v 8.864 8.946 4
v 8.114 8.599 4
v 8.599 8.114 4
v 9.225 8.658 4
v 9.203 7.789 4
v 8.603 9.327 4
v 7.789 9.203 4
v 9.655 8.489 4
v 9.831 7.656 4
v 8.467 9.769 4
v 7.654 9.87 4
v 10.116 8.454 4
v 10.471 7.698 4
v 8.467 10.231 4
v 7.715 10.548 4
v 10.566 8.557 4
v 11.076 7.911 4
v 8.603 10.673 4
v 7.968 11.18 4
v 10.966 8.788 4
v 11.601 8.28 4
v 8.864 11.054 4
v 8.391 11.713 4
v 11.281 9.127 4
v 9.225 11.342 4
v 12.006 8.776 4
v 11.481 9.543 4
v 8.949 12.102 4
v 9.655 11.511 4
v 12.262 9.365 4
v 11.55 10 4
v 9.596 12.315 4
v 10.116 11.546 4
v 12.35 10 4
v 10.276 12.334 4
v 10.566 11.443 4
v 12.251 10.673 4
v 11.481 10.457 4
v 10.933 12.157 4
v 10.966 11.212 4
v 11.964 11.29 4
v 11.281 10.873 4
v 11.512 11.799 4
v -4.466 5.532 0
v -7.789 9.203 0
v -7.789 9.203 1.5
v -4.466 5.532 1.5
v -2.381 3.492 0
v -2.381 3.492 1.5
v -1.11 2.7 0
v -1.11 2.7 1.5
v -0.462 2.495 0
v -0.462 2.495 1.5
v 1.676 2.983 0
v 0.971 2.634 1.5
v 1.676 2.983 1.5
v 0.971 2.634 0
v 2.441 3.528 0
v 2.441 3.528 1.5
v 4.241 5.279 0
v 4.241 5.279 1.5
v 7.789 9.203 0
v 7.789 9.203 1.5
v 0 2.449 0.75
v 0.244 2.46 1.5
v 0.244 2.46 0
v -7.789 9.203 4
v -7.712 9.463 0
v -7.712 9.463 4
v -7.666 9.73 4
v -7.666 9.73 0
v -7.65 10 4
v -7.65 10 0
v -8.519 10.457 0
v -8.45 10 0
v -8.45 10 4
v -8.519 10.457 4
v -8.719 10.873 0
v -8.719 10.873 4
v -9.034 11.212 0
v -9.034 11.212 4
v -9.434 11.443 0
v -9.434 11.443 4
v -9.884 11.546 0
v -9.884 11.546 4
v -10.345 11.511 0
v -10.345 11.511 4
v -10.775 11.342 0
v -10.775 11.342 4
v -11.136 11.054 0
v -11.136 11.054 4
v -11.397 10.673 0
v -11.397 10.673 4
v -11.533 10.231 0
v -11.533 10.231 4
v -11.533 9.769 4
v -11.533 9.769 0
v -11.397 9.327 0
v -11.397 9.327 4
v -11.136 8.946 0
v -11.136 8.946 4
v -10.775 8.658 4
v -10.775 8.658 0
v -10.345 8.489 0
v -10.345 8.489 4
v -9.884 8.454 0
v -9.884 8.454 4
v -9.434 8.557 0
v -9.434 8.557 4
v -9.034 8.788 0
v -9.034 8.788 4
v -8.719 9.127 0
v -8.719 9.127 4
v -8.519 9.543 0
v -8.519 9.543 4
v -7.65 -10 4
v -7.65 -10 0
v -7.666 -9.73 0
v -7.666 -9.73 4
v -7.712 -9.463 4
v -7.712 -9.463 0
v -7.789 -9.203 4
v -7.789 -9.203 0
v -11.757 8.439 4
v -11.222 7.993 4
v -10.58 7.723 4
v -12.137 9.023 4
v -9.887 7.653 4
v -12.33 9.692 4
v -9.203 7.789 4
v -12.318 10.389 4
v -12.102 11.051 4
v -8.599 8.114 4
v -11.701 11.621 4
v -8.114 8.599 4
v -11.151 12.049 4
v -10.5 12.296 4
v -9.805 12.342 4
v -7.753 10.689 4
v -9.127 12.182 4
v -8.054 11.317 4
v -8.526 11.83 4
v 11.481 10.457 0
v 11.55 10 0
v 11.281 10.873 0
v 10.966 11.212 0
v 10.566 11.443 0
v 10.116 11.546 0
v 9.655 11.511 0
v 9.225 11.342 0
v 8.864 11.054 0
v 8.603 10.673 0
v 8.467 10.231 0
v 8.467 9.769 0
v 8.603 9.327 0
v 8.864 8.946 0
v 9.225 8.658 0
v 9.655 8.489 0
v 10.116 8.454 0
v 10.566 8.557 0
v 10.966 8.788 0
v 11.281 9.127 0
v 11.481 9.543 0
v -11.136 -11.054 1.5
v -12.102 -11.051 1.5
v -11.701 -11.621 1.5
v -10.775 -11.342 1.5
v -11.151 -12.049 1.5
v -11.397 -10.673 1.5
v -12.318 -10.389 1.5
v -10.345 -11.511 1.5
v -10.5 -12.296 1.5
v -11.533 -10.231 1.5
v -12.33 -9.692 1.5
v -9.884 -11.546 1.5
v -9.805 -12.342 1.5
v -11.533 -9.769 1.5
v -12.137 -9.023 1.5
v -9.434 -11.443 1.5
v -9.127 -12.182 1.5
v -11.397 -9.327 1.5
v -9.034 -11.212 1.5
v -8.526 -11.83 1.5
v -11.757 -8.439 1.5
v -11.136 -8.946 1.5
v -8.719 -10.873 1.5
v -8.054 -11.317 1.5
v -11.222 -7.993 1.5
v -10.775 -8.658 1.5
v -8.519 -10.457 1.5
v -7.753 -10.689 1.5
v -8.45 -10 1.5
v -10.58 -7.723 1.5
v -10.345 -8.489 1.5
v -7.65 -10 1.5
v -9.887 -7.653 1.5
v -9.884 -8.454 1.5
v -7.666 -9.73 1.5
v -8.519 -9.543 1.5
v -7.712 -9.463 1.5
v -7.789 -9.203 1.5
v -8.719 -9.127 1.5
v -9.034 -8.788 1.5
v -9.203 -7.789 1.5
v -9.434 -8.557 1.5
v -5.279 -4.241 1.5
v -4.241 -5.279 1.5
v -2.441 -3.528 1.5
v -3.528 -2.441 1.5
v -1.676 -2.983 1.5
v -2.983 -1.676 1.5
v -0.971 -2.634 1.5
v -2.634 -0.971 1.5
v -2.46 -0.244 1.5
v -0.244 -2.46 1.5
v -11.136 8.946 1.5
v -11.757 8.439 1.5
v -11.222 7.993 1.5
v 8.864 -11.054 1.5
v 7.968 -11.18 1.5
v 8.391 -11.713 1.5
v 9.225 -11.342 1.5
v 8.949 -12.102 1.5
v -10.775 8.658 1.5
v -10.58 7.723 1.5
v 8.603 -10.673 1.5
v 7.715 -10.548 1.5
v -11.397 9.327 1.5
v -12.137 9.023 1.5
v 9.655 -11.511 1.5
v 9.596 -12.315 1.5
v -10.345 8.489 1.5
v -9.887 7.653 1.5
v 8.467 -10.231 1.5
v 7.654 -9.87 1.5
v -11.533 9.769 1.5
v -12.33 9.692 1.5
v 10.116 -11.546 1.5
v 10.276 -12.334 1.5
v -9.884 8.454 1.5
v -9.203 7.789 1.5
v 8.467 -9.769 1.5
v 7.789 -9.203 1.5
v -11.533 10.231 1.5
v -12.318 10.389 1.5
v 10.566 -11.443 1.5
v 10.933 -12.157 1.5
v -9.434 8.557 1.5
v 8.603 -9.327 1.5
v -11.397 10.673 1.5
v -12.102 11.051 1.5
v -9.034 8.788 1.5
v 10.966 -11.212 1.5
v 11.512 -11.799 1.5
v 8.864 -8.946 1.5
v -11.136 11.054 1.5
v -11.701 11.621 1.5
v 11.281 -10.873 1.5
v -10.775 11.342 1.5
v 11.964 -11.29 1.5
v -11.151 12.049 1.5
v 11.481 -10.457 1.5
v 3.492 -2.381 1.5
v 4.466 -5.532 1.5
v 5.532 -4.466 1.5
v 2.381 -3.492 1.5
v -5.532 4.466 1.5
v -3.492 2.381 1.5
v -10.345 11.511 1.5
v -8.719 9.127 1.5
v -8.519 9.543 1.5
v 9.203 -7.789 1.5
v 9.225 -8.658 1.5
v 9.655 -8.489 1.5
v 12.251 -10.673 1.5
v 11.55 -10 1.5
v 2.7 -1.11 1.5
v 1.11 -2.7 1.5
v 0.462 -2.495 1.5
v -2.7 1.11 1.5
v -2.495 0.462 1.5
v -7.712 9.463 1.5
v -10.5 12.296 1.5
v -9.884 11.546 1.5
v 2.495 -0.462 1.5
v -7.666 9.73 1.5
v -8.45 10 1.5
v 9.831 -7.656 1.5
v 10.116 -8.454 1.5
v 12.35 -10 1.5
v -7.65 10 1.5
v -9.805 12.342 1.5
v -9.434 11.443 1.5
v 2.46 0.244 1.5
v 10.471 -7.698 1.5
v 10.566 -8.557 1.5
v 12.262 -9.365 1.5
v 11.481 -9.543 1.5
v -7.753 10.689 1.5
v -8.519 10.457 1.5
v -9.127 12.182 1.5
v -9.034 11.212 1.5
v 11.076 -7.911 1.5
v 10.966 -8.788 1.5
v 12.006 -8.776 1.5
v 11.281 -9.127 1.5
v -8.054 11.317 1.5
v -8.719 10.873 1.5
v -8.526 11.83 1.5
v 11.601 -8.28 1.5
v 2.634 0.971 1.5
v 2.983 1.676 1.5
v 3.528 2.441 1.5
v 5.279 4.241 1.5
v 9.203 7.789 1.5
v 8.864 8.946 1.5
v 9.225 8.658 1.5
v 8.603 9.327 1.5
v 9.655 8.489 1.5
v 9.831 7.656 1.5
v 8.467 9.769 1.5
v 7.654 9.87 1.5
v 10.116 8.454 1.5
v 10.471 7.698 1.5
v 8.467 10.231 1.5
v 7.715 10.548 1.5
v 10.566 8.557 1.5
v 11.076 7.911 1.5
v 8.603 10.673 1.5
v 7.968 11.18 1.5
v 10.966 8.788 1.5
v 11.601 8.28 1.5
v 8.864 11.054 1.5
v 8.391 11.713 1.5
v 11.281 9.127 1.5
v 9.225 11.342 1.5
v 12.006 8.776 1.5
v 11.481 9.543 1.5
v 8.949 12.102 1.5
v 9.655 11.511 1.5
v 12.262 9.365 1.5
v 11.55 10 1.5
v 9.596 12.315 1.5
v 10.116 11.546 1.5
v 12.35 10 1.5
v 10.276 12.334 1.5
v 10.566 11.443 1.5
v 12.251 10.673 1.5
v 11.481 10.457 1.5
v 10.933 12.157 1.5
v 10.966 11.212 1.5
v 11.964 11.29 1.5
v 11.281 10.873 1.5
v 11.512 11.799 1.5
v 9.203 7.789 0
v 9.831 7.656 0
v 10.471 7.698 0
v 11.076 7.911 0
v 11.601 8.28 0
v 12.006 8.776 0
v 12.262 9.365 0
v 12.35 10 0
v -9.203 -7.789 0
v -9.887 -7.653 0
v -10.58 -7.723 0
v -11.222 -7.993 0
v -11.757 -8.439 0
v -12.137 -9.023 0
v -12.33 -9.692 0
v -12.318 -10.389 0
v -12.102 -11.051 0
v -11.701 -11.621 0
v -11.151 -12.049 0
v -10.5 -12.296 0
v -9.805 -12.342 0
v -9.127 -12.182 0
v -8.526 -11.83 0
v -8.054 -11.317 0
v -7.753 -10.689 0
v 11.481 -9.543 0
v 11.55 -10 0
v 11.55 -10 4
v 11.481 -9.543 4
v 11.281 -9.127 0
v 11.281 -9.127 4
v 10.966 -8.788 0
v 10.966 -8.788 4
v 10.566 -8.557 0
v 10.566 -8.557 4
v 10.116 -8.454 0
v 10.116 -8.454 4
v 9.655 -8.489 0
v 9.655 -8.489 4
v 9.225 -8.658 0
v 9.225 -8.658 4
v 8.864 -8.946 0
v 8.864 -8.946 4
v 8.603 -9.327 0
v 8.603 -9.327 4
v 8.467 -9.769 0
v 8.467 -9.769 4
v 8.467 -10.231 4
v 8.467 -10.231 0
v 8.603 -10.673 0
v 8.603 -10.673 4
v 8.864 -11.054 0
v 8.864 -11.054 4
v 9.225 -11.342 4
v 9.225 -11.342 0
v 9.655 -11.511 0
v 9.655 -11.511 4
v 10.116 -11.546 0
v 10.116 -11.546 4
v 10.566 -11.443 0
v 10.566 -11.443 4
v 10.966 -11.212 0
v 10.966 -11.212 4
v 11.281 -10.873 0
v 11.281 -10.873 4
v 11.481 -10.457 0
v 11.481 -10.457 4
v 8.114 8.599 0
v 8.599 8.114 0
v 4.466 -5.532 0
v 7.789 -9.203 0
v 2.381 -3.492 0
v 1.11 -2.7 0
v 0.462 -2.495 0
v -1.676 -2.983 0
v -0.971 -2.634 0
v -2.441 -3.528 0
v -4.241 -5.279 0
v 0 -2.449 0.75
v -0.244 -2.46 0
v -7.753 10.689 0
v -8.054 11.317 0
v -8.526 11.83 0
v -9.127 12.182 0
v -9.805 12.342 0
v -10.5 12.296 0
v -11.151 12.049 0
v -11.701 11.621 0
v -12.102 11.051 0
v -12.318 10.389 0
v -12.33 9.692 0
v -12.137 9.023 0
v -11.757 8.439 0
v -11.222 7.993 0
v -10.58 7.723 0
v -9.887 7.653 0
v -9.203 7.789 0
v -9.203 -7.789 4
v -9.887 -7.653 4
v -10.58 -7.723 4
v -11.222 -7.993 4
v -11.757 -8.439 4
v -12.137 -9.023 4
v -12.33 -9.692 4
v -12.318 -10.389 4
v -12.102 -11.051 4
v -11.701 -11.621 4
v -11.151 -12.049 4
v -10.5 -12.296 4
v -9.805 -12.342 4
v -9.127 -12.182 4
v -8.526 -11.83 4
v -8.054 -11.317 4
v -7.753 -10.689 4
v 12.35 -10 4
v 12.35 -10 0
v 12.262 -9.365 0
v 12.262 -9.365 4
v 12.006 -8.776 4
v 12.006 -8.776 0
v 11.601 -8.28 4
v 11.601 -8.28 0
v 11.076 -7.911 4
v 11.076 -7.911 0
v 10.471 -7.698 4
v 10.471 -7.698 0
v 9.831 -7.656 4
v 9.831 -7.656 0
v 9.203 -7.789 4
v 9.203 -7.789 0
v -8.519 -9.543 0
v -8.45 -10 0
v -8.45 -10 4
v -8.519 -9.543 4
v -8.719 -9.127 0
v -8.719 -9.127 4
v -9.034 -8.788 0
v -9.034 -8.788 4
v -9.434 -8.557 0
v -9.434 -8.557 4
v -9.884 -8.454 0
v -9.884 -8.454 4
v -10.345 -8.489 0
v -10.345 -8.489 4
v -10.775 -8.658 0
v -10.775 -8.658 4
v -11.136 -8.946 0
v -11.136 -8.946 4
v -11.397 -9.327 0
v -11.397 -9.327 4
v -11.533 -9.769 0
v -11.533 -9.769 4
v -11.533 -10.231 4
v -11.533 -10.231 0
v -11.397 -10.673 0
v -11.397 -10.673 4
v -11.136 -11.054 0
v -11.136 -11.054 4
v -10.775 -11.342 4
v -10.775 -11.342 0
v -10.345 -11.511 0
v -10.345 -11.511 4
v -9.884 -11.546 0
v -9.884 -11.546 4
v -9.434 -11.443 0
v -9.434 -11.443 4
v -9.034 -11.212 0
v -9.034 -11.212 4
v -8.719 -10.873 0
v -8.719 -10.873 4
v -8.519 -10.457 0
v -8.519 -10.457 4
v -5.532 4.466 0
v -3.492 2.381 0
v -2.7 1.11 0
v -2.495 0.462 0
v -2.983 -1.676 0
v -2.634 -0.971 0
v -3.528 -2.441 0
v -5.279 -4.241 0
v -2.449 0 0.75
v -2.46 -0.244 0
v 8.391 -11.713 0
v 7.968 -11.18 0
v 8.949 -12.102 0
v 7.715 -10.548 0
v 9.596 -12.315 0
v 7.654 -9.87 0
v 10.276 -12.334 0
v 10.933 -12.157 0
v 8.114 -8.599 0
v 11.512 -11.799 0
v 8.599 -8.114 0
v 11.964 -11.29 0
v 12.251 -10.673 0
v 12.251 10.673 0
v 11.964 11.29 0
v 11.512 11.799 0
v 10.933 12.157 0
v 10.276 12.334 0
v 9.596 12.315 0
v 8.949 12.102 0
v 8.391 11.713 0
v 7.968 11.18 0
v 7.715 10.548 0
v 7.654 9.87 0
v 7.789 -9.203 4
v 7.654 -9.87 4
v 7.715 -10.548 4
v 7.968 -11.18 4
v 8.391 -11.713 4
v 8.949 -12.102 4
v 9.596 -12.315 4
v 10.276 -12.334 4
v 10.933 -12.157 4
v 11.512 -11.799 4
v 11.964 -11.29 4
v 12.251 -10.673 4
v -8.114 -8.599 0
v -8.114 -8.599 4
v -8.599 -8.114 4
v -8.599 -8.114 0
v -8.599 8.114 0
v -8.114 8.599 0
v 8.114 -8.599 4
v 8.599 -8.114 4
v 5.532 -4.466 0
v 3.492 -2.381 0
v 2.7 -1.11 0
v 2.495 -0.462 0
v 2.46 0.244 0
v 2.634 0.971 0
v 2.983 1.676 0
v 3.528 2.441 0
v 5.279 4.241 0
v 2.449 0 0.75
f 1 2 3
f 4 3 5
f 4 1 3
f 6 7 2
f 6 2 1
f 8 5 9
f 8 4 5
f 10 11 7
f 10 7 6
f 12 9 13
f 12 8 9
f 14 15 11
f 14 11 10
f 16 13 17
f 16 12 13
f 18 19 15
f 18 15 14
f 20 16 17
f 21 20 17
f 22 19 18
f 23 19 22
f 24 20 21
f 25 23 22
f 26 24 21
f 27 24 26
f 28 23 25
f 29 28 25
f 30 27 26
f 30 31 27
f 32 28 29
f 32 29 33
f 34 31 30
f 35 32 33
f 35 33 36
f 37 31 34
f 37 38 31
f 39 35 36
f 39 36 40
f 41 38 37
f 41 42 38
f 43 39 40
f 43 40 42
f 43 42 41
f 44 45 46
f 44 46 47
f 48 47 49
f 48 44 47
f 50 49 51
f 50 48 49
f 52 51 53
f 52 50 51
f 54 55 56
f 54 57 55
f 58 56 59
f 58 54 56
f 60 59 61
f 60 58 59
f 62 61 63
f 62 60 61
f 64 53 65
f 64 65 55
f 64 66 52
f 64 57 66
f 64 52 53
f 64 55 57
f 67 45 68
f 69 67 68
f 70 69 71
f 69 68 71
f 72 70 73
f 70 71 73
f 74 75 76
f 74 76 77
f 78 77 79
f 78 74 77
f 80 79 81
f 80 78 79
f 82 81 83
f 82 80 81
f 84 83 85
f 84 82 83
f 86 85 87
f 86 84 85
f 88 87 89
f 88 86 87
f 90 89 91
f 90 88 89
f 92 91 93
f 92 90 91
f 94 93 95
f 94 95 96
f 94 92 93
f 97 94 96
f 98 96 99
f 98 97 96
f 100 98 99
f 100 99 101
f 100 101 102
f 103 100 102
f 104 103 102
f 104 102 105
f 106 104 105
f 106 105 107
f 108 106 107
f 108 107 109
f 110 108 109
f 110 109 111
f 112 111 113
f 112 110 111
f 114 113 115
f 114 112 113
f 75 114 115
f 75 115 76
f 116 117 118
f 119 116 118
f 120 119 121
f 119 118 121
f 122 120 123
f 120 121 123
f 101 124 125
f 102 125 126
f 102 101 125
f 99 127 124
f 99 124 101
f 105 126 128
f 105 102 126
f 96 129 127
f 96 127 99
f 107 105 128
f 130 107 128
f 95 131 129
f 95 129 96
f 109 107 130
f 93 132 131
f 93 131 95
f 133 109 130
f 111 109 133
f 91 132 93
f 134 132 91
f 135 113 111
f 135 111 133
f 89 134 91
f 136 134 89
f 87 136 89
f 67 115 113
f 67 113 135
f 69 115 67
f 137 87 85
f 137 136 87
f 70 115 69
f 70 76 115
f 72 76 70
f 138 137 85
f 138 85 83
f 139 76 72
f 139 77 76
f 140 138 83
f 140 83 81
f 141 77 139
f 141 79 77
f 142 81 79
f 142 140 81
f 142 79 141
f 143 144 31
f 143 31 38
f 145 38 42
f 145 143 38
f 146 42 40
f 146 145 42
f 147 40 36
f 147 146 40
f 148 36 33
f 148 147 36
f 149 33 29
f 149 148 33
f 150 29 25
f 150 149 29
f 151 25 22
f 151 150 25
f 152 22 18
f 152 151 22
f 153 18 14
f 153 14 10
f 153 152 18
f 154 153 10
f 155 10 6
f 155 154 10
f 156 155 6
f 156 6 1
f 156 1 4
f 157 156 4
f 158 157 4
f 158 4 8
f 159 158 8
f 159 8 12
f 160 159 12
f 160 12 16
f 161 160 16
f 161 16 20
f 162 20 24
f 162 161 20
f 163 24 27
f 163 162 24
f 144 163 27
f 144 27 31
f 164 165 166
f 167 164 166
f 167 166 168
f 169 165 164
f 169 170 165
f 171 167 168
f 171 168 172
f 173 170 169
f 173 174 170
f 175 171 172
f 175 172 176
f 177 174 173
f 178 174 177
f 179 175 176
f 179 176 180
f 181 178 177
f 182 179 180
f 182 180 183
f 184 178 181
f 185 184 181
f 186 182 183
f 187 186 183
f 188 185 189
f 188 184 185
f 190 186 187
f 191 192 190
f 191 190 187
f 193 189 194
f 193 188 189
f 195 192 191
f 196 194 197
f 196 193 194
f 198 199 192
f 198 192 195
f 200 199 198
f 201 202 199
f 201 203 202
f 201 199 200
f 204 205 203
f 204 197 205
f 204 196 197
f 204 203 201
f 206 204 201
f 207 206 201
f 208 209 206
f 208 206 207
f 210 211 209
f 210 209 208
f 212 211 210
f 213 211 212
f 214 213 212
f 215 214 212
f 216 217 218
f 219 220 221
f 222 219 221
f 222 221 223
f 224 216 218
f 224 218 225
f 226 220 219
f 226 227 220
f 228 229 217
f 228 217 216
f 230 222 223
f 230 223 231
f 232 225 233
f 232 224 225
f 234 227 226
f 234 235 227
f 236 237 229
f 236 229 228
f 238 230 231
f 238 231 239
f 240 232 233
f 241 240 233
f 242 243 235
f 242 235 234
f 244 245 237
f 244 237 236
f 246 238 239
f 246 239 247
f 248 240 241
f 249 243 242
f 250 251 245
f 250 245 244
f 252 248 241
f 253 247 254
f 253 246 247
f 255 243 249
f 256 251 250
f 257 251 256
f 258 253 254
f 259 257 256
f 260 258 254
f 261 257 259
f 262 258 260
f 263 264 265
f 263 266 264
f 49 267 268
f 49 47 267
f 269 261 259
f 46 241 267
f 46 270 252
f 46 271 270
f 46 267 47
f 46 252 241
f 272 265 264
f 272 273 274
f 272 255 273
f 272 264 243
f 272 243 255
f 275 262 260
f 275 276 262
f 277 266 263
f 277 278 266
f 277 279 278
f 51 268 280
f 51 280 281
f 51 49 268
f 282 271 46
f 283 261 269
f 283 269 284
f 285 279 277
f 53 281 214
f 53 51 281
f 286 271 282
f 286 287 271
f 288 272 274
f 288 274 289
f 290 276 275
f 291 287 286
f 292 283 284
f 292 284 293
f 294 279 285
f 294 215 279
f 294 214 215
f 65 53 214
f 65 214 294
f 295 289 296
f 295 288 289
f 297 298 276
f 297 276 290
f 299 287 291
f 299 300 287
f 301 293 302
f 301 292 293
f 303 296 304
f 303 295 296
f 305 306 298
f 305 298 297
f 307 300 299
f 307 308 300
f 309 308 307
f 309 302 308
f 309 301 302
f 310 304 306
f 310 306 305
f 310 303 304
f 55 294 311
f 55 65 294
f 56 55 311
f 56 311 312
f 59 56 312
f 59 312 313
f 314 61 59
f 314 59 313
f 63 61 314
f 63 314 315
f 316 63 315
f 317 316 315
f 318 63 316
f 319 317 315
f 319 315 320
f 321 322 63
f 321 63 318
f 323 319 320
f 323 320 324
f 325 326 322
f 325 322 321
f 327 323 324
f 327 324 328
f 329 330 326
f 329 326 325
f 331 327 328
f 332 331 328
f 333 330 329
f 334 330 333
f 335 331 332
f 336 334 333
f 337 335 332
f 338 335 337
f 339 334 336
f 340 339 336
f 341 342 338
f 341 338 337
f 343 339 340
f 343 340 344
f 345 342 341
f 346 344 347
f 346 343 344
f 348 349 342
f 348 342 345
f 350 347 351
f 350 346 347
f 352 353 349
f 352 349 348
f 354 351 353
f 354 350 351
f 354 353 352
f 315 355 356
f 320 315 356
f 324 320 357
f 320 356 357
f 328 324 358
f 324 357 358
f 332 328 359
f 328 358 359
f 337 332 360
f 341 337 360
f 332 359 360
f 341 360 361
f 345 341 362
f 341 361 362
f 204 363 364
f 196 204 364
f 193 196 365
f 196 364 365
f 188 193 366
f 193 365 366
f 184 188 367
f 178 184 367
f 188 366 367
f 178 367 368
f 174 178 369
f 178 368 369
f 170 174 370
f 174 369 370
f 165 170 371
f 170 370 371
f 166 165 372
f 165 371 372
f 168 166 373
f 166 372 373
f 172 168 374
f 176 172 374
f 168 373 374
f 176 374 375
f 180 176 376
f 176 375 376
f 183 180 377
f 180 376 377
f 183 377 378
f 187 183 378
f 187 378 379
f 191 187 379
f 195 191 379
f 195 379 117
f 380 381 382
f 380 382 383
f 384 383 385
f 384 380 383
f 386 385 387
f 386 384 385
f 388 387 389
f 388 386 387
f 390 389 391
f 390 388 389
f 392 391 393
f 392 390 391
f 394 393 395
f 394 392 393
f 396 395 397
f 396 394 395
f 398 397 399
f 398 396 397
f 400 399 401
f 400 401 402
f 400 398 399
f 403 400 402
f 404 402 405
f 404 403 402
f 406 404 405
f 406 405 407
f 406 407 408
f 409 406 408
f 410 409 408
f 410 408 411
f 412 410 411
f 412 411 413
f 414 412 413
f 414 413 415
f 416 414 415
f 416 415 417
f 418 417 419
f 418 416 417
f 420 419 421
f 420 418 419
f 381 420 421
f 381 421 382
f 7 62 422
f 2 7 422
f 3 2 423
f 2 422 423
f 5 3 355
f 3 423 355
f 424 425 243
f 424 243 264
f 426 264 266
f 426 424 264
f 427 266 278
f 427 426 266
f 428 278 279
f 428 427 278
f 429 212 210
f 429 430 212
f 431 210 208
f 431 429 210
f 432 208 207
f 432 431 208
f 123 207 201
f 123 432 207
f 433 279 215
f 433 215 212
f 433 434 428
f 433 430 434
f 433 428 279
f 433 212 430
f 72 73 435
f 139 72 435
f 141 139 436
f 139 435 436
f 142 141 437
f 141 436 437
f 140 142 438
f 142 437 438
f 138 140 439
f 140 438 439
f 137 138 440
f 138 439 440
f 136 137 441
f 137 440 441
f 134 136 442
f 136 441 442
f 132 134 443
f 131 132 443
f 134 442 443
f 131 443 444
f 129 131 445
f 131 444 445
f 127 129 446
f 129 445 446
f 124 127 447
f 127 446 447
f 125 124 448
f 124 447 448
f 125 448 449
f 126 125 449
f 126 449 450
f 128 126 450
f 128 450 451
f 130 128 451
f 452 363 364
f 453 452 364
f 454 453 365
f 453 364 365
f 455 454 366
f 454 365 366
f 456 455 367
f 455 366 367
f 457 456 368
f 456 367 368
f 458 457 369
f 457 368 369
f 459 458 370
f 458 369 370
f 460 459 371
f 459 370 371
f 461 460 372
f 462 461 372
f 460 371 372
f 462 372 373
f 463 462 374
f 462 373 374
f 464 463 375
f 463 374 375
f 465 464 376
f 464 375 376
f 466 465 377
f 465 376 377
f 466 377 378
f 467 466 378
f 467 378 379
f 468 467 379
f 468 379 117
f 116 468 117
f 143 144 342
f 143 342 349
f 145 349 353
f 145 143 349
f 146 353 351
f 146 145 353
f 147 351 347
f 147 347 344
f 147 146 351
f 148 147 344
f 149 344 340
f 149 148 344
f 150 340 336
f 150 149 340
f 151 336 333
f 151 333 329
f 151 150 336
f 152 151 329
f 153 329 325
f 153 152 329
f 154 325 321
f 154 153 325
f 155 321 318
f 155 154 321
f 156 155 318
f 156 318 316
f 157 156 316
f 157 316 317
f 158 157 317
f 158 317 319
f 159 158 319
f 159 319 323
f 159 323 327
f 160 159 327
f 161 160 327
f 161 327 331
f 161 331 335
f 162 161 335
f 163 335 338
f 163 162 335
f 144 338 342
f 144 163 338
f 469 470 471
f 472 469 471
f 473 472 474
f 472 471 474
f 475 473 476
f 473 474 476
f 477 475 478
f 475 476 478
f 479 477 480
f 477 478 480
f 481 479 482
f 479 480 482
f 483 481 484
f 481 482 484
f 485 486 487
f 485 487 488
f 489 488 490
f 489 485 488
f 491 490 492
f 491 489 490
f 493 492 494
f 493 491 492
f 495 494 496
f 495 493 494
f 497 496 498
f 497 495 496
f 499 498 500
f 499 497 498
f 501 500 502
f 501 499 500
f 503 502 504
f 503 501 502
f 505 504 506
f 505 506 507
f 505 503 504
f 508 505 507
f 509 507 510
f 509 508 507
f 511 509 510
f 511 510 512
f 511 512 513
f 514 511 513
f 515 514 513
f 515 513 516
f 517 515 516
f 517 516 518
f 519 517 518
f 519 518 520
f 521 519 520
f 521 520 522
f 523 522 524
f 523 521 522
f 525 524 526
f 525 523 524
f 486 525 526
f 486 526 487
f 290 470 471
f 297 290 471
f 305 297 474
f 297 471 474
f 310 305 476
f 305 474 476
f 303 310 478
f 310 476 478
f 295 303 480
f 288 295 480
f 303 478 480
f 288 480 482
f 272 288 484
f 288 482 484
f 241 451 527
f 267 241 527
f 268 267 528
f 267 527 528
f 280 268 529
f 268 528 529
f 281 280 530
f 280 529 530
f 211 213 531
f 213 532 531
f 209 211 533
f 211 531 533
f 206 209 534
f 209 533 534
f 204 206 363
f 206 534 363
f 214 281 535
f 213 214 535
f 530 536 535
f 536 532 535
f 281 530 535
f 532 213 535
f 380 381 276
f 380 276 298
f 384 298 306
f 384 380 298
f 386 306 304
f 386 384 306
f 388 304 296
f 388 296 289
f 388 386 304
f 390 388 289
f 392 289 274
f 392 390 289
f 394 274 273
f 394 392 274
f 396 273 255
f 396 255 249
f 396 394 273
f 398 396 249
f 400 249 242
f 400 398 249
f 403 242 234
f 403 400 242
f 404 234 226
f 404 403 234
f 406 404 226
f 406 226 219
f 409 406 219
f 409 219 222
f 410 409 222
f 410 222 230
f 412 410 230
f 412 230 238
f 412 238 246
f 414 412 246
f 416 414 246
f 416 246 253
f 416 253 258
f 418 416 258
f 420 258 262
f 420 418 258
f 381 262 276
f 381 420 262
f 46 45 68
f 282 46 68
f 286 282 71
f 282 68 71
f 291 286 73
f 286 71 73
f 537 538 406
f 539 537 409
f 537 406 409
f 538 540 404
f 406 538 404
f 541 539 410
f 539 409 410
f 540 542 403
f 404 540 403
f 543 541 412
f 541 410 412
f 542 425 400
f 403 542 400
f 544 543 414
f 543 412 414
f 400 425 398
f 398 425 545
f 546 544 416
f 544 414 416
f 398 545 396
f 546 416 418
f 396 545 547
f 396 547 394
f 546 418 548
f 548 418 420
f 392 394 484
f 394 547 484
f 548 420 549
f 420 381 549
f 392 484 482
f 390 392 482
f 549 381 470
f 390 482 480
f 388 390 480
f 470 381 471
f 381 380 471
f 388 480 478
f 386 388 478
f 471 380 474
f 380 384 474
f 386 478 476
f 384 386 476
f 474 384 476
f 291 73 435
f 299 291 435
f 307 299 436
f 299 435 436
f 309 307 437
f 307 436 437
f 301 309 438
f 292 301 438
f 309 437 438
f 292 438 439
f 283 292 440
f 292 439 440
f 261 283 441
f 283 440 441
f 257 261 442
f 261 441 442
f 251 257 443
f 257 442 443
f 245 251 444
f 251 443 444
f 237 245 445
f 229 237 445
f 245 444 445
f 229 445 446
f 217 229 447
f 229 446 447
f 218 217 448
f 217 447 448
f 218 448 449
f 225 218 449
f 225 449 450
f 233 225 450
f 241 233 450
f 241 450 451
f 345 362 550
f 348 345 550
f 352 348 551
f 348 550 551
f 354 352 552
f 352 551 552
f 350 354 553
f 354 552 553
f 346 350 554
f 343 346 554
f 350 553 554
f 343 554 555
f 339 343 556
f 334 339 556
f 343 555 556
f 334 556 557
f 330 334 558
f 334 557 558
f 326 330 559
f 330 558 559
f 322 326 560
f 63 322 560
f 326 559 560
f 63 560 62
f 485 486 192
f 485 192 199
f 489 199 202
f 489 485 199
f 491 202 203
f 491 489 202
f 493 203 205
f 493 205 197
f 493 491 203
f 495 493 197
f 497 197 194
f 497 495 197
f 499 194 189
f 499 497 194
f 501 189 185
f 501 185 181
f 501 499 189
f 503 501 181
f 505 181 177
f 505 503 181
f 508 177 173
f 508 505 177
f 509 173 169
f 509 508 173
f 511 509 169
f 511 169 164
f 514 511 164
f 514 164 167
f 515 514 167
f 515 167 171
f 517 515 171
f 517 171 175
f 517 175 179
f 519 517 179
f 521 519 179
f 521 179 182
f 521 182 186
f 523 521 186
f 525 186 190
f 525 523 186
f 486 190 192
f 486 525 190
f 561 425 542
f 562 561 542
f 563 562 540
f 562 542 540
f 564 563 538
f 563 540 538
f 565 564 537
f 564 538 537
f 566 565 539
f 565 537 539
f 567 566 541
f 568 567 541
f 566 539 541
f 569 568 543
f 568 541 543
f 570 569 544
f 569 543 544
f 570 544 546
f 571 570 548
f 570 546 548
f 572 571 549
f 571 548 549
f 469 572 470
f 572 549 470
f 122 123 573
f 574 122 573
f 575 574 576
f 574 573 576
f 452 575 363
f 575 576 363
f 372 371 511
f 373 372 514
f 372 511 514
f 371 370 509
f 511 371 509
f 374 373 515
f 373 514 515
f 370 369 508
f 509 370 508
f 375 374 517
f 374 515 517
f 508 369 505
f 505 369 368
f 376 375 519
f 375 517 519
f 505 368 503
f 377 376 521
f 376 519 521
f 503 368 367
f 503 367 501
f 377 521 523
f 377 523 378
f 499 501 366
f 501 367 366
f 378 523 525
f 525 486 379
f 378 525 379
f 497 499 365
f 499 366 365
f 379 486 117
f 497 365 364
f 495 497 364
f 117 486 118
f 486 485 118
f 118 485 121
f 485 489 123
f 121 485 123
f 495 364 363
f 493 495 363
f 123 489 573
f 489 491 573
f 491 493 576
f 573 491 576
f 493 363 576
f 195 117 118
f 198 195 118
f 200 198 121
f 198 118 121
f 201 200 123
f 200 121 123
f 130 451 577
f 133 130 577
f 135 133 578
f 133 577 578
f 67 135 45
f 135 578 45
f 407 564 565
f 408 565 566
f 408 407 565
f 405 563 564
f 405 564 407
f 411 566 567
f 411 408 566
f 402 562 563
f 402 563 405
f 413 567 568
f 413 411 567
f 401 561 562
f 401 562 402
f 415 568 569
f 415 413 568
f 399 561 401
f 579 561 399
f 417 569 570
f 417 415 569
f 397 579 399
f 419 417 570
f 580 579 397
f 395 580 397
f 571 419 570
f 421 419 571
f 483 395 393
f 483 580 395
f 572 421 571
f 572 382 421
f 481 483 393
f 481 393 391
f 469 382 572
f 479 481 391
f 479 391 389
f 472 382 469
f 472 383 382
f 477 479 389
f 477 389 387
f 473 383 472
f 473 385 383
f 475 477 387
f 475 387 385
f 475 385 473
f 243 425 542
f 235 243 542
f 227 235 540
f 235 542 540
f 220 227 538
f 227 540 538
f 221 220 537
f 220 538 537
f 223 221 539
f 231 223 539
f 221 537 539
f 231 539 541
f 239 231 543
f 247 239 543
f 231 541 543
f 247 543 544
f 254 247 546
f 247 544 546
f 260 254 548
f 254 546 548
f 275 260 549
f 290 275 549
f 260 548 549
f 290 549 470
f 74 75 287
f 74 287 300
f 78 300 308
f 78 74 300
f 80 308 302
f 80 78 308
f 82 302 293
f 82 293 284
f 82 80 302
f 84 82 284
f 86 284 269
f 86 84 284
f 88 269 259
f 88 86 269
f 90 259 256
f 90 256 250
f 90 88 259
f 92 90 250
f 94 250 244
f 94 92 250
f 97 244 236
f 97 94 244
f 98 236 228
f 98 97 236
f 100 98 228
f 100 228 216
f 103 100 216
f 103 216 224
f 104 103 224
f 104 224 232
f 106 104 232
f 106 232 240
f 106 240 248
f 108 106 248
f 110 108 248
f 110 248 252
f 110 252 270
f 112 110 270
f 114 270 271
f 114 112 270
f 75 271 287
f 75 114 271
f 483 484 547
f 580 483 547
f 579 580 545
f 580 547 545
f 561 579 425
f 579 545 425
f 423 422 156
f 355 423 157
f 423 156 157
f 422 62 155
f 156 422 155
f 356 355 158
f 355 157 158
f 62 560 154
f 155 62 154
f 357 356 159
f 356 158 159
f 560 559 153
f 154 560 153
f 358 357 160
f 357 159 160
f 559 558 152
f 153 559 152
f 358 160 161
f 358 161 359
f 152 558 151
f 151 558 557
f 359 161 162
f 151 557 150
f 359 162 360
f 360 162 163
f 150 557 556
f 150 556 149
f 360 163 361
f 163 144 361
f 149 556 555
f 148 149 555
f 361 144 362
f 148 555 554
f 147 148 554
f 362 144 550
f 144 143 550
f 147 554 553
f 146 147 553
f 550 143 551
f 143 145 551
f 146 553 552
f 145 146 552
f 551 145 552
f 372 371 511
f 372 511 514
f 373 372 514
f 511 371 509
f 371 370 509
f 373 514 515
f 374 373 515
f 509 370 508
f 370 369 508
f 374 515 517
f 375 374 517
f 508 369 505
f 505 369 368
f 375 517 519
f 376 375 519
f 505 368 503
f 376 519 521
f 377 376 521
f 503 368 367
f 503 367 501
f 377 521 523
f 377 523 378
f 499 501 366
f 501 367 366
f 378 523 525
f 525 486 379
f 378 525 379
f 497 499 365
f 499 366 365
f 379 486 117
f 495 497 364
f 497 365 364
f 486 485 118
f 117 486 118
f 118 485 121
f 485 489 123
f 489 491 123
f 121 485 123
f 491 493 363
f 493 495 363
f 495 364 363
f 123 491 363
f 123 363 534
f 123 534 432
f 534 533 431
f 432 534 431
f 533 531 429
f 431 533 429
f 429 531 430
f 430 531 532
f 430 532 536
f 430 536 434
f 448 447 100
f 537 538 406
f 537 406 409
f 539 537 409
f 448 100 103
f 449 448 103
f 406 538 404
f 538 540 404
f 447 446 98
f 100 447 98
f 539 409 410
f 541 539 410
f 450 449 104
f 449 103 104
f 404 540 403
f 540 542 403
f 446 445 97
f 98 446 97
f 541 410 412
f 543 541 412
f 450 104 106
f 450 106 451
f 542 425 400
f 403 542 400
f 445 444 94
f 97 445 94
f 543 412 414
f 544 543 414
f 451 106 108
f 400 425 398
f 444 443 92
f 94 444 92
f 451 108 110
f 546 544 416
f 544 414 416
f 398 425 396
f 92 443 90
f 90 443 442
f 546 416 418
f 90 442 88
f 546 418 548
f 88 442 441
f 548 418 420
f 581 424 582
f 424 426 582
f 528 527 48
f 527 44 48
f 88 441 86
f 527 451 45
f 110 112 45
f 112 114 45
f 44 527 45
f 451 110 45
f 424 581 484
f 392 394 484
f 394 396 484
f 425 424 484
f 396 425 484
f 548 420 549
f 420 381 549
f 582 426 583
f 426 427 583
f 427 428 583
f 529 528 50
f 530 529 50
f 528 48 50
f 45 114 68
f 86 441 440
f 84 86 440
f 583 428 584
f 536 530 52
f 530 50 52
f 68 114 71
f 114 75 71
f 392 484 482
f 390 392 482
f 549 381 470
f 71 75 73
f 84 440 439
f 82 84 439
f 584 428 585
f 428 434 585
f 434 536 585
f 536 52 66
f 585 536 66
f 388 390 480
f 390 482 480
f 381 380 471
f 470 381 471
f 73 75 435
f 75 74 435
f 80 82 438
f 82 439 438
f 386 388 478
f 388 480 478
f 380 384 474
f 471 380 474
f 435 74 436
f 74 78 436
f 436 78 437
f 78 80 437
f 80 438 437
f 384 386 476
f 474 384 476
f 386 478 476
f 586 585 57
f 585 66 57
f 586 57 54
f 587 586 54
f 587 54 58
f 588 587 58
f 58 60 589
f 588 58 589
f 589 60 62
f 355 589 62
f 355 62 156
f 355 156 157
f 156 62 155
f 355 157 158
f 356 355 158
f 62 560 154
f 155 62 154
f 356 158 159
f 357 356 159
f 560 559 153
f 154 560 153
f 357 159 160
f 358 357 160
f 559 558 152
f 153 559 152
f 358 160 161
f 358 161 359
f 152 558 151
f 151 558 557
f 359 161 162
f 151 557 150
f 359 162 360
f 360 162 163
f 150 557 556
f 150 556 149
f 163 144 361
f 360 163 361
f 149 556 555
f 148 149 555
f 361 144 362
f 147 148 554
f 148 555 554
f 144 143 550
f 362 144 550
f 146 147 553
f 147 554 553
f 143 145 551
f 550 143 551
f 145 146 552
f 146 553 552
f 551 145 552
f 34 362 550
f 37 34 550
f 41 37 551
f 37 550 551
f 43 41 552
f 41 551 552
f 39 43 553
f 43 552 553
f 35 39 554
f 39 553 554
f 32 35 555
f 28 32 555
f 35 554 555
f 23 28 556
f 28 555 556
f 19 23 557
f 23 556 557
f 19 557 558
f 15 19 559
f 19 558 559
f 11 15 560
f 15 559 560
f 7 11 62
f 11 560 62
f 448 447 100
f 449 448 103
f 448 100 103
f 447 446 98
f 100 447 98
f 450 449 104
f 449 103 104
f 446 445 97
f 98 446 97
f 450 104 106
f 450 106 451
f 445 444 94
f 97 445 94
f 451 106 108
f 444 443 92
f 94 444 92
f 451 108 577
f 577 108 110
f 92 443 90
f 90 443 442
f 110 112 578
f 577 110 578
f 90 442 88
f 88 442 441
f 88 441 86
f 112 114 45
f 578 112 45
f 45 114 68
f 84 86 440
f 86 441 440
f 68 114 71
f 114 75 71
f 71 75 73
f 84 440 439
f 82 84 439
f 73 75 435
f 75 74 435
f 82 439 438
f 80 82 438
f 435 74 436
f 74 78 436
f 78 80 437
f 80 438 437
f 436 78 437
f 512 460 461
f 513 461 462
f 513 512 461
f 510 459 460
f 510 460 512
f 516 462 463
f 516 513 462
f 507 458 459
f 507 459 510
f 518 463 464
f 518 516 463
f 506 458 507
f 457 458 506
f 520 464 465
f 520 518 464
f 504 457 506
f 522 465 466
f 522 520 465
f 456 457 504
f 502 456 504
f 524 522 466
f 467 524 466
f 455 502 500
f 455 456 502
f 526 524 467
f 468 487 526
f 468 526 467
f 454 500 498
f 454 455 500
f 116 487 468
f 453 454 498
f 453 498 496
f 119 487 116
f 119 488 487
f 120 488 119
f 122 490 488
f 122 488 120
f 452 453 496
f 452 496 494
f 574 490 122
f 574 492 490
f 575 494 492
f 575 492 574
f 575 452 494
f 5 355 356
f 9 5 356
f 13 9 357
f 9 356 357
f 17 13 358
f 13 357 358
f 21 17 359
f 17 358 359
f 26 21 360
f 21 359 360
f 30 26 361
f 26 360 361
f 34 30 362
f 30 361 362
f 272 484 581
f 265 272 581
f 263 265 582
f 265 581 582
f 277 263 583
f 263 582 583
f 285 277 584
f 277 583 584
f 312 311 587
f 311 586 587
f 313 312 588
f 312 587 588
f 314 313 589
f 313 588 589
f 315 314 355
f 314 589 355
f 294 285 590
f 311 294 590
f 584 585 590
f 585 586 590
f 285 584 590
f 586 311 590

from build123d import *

# Parameters (mm, degrees)
F0_R     = 1.55
F1_DEPTH = 4
F2_DEPTH = 1.5


with BuildPart() as f1:
    # F0 (on Top) → F1 (new body)
    with BuildSketch(Plane.XY):
        with BuildLine():
            ThreePointArc((-7.7891478946, 9.203361457), (-7.6850483323, 9.5956501809), (-7.65, 10))
            ThreePointArc((-7.65, 10), (-11.9228365214, 11.3509995233), (-9.203361457, 7.7891478946))
            ThreePointArc((-9.203361457, 7.7891478946), (-8.3382990642, 8.3382990642), (-7.7891478946, 9.203361457))
        make_face()
        with Locations((-10, 10)):
            Circle(F0_R, mode=Mode.SUBTRACT)
    extrude(amount=F1_DEPTH)


with BuildPart() as f1b:
    # F0 (on Top) → F1, piece 2 (new body)
    with BuildSketch(Plane.XY):
        with BuildLine():
            ThreePointArc((-7.7891478946, -9.203361457), (-8.3382990642, -8.3382990642), (-9.203361457, -7.7891478946))
            ThreePointArc((-9.203361457, -7.7891478946), (-11.9228365214, -11.3509995233), (-7.65, -10))
            ThreePointArc((-7.65, -10), (-7.6850483323, -9.5956501809), (-7.7891478946, -9.203361457))
        make_face()
        with Locations((-10, -10)):
            Circle(F0_R, mode=Mode.SUBTRACT)
    extrude(amount=F1_DEPTH)


with BuildPart() as f1c:
    # F0 (on Top) → F1, piece 3 (new body)
    with BuildSketch(Plane.XY):
        with BuildLine():
            ThreePointArc((12.35, 10), (9.5956501809, 12.3149516677), (7.7891478946, 9.203361457))
            ThreePointArc((7.7891478946, 9.203361457), (8.3382990642, 8.3382990642), (9.203361457, 7.7891478946))
            ThreePointArc((9.203361457, 7.7891478946), (11.3509995233, 8.0771634786), (12.35, 10))
        make_face()
        with Locations((10, 10)):
            Circle(F0_R, mode=Mode.SUBTRACT)
    extrude(amount=F1_DEPTH)


with BuildPart() as f1d:
    # F0 (on Top) → F1, piece 4 (new body)
    with BuildSketch(Plane.XY):
        with BuildLine():
            ThreePointArc((9.203361457, -7.7891478946), (8.3382990642, -8.3382990642), (7.7891478946, -9.203361457))
            ThreePointArc((7.7891478946, -9.203361457), (9.5956501809, -12.3149516677), (12.35, -10))
            ThreePointArc((12.35, -10), (11.3509995233, -8.0771634786), (9.203361457, -7.7891478946))
        make_face()
        with Locations((10, -10)):
            Circle(F0_R, mode=Mode.SUBTRACT)
    extrude(amount=F1_DEPTH)


with BuildPart() as f2:
    # F0 (on Top) → F2 (new body)
    with BuildSketch(Plane.XY):
        with BuildLine():
            ThreePointArc((-7.7891478946, 9.203361457), (-7.6850483323, 9.5956501809), (-7.65, 10))
            ThreePointArc((-7.65, 10), (-11.9228365214, 11.3509995233), (-9.203361457, 7.7891478946))
            ThreePointArc((-9.203361457, 7.7891478946), (-8.3382990642, 8.3382990642), (-7.7891478946, 9.203361457))
        make_face()
        with Locations((-10, 10)):
            Circle(F0_R, mode=Mode.SUBTRACT)
        with BuildLine():
            ThreePointArc((-7.7891478946, 9.203361457), (-8.3382990642, 8.3382990642), (-9.203361457, 7.7891478946))
            add(Edge.make_bspline(
                [(-9.203361457, 7.7891478946), (-6.3624616014, 4.948248039), (1.441069995, -0.0242898241), (-6.3138819532, -4.8996683909), (-9.203361457, -7.7891478946)],
                knots=[0, 0, 0, 0, 0.5, 1, 1, 1, 1], degree=3))
            ThreePointArc((-9.203361457, -7.7891478946), (-8.3382990642, -8.3382990642), (-7.7891478946, -9.203361457))
            add(Edge.make_bspline(
                [(7.7891478946, -9.203361457), (4.948248039, -6.3624616014), (-0.0242898241, 1.441069995), (-4.8996683909, -6.3138819532), (-7.7891478946, -9.203361457)],
                knots=[0, 0, 0, 0, 0.5, 1, 1, 1, 1], degree=3))
            ThreePointArc((7.7891478946, -9.203361457), (8.3382990642, -8.3382990642), (9.203361457, -7.7891478946))
            add(Edge.make_bspline(
                [(9.203361457, -7.7891478946), (6.3624616014, -4.948248039), (-1.441069995, 0.0242898241), (6.3138819532, 4.8996683909), (9.203361457, 7.7891478946)],
                knots=[0, 0, 0, 0, 0.5, 1, 1, 1, 1], degree=3))
            ThreePointArc((9.203361457, 7.7891478946), (8.3382990642, 8.3382990642), (7.7891478946, 9.203361457))
            add(Edge.make_bspline(
                [(-7.7891478946, 9.203361457), (-4.948248039, 6.3624616014), (0.0242898241, -1.441069995), (4.8996683909, 6.3138819532), (7.7891478946, 9.203361457)],
                knots=[0, 0, 0, 0, 0.5, 1, 1, 1, 1], degree=3))
        make_face()
        with BuildLine():
            ThreePointArc((-7.7891478946, -9.203361457), (-8.3382990642, -8.3382990642), (-9.203361457, -7.7891478946))
            ThreePointArc((-9.203361457, -7.7891478946), (-11.9228365214, -11.3509995233), (-7.65, -10))
            ThreePointArc((-7.65, -10), (-7.6850483323, -9.5956501809), (-7.7891478946, -9.203361457))
        make_face()
        with Locations((-10, -10)):
            Circle(F0_R, mode=Mode.SUBTRACT)
        with BuildLine():
            ThreePointArc((12.35, 10), (9.5956501809, 12.3149516677), (7.7891478946, 9.203361457))
            ThreePointArc((7.7891478946, 9.203361457), (8.3382990642, 8.3382990642), (9.203361457, 7.7891478946))
            ThreePointArc((9.203361457, 7.7891478946), (11.3509995233, 8.0771634786), (12.35, 10))
        make_face()
        with Locations((10, 10)):
            Circle(F0_R, mode=Mode.SUBTRACT)
        with BuildLine():
            ThreePointArc((9.203361457, -7.7891478946), (8.3382990642, -8.3382990642), (7.7891478946, -9.203361457))
            ThreePointArc((7.7891478946, -9.203361457), (9.5956501809, -12.3149516677), (12.35, -10))
            ThreePointArc((12.35, -10), (11.3509995233, -8.0771634786), (9.203361457, -7.7891478946))
        make_face()
        with Locations((10, -10)):
            Circle(F0_R, mode=Mode.SUBTRACT)
    extrude(amount=F2_DEPTH)


solid = Compound([f1.part, f1b.part, f1c.part, f1d.part, f2.part])
